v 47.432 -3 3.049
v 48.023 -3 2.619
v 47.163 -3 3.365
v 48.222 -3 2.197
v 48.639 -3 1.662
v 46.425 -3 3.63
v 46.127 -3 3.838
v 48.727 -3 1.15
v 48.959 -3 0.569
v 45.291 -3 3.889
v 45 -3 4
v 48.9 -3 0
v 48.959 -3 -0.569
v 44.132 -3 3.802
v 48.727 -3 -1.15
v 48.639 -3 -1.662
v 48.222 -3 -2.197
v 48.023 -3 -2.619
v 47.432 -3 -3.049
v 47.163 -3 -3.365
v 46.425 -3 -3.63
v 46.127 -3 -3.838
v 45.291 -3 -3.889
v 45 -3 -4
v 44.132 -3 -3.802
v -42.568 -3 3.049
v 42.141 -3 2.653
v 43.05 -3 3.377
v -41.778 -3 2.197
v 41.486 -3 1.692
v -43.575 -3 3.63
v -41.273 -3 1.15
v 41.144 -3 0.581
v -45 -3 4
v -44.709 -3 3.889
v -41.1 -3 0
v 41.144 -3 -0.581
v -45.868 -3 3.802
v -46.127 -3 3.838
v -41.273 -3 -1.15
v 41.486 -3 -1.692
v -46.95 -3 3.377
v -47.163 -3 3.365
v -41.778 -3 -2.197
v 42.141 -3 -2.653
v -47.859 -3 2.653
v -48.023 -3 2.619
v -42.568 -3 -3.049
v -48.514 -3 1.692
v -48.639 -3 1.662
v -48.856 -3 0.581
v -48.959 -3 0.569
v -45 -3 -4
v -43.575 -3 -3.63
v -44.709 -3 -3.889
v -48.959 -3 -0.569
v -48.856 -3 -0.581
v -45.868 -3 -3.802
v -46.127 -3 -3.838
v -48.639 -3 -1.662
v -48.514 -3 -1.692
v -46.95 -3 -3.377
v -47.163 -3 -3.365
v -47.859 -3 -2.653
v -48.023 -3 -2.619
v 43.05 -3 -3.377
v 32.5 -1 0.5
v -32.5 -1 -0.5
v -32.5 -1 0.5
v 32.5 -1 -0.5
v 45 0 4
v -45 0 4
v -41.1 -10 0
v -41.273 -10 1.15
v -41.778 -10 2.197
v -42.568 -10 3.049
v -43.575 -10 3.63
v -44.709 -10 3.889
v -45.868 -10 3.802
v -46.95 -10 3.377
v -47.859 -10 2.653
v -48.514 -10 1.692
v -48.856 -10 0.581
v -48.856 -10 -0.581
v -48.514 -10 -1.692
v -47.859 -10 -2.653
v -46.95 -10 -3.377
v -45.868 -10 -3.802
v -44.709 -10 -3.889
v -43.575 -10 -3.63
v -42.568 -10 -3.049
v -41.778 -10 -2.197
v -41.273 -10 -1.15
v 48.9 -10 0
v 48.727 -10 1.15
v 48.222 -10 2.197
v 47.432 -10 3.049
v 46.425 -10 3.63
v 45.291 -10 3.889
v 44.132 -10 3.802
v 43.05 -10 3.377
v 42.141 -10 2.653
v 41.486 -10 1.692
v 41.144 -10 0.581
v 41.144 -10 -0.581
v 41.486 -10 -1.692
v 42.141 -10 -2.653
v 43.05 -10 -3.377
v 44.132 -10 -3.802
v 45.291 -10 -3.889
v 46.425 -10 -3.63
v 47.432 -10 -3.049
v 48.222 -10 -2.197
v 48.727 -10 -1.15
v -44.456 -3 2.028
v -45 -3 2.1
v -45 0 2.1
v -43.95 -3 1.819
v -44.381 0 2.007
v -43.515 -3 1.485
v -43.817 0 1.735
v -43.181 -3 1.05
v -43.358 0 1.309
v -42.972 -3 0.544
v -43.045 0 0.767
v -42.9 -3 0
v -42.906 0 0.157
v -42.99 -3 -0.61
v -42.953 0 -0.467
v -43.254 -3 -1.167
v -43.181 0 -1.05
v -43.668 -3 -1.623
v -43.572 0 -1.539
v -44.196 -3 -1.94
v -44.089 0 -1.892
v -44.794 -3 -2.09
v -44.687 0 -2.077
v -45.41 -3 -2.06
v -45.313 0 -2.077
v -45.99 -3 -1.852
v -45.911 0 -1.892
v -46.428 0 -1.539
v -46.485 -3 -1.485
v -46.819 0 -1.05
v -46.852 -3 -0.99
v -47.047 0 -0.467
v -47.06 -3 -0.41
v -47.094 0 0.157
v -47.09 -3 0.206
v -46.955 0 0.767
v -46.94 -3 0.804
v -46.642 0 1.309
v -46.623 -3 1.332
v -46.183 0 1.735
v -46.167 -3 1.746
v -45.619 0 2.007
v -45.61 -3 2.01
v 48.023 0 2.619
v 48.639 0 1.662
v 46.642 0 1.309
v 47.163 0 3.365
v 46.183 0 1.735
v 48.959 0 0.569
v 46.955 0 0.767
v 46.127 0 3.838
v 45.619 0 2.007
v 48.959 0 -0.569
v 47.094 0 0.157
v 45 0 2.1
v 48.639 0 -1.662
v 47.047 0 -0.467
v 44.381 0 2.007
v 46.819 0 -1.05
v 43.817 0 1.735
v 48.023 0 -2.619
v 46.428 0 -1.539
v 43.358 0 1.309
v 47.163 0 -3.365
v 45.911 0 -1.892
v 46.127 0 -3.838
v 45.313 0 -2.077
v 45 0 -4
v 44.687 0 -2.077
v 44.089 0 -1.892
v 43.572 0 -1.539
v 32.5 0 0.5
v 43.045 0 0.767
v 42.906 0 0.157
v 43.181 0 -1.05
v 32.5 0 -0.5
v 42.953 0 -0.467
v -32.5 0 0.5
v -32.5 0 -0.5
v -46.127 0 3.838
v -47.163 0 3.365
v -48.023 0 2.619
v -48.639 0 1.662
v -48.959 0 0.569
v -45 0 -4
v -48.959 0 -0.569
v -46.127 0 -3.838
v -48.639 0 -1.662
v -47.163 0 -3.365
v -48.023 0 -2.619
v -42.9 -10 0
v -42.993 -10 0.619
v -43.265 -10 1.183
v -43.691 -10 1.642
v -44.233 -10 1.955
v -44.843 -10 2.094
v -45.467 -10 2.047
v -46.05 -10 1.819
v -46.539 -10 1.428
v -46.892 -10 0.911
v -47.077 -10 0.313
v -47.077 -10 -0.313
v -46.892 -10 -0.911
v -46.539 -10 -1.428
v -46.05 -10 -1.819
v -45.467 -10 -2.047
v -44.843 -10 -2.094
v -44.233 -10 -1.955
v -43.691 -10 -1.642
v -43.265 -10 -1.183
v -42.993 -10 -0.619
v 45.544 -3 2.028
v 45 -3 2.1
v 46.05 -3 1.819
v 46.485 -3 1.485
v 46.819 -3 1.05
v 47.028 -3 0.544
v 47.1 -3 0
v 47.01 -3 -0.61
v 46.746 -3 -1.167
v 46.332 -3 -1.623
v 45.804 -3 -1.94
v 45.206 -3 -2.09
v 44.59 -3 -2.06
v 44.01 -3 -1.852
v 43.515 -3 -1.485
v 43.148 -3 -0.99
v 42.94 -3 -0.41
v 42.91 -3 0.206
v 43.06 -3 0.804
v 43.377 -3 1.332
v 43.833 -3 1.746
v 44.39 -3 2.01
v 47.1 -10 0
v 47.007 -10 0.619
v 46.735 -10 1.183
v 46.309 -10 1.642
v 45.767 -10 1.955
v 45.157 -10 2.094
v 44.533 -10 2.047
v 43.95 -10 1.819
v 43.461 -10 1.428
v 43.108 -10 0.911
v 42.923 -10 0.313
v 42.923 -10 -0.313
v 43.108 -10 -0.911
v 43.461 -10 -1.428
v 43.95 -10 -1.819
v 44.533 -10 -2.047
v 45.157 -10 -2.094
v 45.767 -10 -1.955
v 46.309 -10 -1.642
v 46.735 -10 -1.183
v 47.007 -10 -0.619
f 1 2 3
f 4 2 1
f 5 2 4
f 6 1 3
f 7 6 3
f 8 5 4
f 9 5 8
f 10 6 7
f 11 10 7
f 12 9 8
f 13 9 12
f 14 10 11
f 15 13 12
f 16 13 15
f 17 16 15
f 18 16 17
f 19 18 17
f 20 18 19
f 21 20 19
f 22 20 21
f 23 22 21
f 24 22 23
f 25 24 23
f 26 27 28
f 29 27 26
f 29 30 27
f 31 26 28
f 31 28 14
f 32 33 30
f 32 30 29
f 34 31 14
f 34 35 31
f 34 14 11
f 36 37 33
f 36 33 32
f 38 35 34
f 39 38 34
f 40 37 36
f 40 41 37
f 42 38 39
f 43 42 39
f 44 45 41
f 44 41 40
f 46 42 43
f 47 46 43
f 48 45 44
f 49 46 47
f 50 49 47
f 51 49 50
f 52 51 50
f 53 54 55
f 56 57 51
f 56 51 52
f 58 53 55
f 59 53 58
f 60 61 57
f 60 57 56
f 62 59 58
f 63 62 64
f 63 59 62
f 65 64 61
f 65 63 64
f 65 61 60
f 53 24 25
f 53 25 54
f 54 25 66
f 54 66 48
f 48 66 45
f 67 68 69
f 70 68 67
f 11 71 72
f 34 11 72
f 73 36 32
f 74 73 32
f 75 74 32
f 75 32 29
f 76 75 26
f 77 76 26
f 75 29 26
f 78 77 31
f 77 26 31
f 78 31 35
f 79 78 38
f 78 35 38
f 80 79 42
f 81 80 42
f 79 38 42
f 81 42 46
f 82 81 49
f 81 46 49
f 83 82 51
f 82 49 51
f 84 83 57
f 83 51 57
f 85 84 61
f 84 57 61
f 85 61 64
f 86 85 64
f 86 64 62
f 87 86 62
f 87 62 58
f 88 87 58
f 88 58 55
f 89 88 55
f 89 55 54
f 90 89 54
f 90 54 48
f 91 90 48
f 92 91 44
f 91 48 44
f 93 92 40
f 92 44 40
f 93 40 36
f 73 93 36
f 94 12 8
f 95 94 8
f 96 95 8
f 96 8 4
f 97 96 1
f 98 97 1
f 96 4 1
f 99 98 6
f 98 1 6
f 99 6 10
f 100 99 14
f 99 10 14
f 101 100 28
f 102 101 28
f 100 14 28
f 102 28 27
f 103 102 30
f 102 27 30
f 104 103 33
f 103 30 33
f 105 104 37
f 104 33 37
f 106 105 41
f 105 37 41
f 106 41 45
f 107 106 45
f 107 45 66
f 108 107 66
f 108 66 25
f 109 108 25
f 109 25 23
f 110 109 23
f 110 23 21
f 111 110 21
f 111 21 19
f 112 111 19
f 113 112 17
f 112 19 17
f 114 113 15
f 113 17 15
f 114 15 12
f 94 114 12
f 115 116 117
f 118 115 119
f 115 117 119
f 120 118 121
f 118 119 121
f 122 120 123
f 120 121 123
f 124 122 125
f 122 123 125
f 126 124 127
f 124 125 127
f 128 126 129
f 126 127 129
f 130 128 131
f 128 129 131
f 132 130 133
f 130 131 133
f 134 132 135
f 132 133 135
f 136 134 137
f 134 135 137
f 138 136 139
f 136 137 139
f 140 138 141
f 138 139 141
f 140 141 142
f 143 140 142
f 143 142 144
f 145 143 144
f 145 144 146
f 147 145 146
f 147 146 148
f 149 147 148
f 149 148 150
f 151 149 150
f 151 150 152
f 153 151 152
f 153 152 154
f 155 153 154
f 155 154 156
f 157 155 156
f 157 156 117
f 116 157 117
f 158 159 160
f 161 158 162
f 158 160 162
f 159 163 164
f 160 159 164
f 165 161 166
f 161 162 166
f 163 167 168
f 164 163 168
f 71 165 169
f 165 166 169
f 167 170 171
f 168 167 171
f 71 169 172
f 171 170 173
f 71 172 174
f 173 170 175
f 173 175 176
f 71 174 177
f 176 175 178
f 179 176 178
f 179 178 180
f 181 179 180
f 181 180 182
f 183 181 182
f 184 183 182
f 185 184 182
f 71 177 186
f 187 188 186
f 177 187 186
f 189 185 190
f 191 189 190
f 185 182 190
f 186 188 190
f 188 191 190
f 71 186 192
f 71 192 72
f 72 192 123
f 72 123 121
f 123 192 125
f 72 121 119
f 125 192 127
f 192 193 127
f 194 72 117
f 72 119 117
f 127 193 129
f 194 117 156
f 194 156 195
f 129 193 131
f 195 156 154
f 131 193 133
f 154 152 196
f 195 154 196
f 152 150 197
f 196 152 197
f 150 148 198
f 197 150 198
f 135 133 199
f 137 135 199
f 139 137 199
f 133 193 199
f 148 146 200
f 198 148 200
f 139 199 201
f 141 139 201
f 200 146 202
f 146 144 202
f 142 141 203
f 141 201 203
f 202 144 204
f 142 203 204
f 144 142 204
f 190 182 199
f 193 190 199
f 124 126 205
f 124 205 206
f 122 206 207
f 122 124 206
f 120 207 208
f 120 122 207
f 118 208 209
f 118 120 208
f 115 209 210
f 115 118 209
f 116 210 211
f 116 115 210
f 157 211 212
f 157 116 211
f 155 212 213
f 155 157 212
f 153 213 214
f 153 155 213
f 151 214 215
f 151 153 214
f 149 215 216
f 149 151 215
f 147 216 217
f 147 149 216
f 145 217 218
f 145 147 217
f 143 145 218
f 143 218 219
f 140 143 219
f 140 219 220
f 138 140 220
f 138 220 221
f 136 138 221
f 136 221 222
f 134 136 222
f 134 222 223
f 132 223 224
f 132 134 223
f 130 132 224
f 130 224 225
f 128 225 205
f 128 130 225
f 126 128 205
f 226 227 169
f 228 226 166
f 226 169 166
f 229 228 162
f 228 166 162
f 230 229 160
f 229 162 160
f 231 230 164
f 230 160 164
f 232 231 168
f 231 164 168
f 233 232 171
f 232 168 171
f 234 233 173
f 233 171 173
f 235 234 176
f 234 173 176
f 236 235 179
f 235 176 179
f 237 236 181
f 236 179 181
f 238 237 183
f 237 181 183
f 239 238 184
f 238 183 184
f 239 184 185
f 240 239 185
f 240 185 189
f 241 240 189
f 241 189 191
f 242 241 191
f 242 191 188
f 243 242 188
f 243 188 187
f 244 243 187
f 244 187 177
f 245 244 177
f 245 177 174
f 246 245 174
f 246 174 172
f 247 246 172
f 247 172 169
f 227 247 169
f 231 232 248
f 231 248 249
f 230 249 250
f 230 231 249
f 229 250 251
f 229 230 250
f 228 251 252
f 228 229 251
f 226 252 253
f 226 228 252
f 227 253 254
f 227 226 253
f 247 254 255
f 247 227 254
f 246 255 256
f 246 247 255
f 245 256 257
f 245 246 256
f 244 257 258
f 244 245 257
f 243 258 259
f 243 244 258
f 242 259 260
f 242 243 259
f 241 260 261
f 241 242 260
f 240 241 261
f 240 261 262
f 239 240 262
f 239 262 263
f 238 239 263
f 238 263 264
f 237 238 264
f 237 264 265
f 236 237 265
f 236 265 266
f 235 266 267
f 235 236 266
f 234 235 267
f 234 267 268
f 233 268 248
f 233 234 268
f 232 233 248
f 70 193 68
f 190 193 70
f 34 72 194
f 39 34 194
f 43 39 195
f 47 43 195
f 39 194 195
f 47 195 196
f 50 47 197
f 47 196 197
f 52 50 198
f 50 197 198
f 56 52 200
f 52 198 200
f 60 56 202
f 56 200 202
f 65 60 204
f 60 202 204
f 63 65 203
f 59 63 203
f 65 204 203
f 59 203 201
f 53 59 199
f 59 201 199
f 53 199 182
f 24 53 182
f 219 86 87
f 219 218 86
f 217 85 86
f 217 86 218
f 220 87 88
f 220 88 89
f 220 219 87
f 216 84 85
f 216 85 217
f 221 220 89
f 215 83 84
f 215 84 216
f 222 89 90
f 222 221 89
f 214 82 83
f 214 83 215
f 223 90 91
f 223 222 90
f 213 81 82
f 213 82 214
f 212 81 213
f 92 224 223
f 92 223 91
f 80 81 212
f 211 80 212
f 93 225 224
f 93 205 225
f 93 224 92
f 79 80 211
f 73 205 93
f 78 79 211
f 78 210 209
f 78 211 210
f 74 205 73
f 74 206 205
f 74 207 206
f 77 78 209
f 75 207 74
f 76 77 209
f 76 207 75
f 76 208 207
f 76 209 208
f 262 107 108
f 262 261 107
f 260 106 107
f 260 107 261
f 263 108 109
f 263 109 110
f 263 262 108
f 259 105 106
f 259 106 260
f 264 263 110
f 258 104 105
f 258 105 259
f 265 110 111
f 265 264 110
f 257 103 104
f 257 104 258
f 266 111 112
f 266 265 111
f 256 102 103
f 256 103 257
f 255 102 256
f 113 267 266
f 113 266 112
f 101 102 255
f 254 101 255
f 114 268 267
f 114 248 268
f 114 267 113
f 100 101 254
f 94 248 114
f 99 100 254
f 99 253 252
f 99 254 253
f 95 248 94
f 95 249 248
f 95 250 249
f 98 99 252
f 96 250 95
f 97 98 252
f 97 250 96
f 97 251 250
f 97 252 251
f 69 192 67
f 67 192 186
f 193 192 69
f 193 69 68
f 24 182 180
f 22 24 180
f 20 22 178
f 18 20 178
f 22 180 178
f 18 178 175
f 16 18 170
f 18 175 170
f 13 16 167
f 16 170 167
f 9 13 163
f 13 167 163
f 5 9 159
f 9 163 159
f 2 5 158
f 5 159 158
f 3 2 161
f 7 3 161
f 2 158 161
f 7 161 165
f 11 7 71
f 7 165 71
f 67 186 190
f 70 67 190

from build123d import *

# Parameters (mm, degrees)
SKETCH1_R           = 2.1
BOSS_EXTRUDE1_DEPTH = 3
SKETCH2_R           = 3.9
SKETCH2_R_2         = 2.1
EXTRUDE_THIN1_DEPTH = 7
SKETCH3_W           = 65
SKETCH3_H           = 1
CUT_EXTRUDE1_DEPTH  = 1


with BuildPart() as part:
    # Sketch1 → Boss-Extrude1 (new body)
    with BuildSketch(Plane(origin=(0, 0, 0), x_dir=(1, 0, 0), z_dir=(0, 1, 0))):
        with BuildLine():
            Line((-45, 4), (45, 4))
            ThreePointArc((45, 4), (49, 0), (45, -4))
            Line((45, -4), (-45, -4))
            ThreePointArc((-45, -4), (-49, 0), (-45, 4))
        make_face()
        with Locations((-45, 0)):
            Circle(SKETCH1_R, mode=Mode.SUBTRACT)
        with Locations((45, 0)):
            Circle(SKETCH1_R, mode=Mode.SUBTRACT)
    extrude(amount=-BOSS_EXTRUDE1_DEPTH)

    # Sketch2 → Extrude-Thin1 (add)
    # profile 1 of 2: a face of its own
    with BuildSketch(Plane.XZ.offset(3)):
        with Locations((45, 0)):
            Circle(SKETCH2_R)
        with Locations((45, 0)):
            Circle(SKETCH2_R_2, mode=Mode.SUBTRACT)
    # profile 2 of 2: a face of its own
    with BuildSketch(Plane.XZ.offset(3)):
        with Locations((-45, 0)):
            Circle(SKETCH2_R)
        with Locations((-45, 0)):
            Circle(SKETCH2_R_2, mode=Mode.SUBTRACT)
    extrude(amount=EXTRUDE_THIN1_DEPTH)

    # Sketch3 → Cut-Extrude1 (cut)
    with BuildSketch(Plane(origin=(0, 0, 0), x_dir=(1, 0, 0), z_dir=(0, 1, 0))):
        Rectangle(SKETCH3_W, SKETCH3_H)
    extrude(amount=-CUT_EXTRUDE1_DEPTH, mode=Mode.SUBTRACT)


solid = part.part
